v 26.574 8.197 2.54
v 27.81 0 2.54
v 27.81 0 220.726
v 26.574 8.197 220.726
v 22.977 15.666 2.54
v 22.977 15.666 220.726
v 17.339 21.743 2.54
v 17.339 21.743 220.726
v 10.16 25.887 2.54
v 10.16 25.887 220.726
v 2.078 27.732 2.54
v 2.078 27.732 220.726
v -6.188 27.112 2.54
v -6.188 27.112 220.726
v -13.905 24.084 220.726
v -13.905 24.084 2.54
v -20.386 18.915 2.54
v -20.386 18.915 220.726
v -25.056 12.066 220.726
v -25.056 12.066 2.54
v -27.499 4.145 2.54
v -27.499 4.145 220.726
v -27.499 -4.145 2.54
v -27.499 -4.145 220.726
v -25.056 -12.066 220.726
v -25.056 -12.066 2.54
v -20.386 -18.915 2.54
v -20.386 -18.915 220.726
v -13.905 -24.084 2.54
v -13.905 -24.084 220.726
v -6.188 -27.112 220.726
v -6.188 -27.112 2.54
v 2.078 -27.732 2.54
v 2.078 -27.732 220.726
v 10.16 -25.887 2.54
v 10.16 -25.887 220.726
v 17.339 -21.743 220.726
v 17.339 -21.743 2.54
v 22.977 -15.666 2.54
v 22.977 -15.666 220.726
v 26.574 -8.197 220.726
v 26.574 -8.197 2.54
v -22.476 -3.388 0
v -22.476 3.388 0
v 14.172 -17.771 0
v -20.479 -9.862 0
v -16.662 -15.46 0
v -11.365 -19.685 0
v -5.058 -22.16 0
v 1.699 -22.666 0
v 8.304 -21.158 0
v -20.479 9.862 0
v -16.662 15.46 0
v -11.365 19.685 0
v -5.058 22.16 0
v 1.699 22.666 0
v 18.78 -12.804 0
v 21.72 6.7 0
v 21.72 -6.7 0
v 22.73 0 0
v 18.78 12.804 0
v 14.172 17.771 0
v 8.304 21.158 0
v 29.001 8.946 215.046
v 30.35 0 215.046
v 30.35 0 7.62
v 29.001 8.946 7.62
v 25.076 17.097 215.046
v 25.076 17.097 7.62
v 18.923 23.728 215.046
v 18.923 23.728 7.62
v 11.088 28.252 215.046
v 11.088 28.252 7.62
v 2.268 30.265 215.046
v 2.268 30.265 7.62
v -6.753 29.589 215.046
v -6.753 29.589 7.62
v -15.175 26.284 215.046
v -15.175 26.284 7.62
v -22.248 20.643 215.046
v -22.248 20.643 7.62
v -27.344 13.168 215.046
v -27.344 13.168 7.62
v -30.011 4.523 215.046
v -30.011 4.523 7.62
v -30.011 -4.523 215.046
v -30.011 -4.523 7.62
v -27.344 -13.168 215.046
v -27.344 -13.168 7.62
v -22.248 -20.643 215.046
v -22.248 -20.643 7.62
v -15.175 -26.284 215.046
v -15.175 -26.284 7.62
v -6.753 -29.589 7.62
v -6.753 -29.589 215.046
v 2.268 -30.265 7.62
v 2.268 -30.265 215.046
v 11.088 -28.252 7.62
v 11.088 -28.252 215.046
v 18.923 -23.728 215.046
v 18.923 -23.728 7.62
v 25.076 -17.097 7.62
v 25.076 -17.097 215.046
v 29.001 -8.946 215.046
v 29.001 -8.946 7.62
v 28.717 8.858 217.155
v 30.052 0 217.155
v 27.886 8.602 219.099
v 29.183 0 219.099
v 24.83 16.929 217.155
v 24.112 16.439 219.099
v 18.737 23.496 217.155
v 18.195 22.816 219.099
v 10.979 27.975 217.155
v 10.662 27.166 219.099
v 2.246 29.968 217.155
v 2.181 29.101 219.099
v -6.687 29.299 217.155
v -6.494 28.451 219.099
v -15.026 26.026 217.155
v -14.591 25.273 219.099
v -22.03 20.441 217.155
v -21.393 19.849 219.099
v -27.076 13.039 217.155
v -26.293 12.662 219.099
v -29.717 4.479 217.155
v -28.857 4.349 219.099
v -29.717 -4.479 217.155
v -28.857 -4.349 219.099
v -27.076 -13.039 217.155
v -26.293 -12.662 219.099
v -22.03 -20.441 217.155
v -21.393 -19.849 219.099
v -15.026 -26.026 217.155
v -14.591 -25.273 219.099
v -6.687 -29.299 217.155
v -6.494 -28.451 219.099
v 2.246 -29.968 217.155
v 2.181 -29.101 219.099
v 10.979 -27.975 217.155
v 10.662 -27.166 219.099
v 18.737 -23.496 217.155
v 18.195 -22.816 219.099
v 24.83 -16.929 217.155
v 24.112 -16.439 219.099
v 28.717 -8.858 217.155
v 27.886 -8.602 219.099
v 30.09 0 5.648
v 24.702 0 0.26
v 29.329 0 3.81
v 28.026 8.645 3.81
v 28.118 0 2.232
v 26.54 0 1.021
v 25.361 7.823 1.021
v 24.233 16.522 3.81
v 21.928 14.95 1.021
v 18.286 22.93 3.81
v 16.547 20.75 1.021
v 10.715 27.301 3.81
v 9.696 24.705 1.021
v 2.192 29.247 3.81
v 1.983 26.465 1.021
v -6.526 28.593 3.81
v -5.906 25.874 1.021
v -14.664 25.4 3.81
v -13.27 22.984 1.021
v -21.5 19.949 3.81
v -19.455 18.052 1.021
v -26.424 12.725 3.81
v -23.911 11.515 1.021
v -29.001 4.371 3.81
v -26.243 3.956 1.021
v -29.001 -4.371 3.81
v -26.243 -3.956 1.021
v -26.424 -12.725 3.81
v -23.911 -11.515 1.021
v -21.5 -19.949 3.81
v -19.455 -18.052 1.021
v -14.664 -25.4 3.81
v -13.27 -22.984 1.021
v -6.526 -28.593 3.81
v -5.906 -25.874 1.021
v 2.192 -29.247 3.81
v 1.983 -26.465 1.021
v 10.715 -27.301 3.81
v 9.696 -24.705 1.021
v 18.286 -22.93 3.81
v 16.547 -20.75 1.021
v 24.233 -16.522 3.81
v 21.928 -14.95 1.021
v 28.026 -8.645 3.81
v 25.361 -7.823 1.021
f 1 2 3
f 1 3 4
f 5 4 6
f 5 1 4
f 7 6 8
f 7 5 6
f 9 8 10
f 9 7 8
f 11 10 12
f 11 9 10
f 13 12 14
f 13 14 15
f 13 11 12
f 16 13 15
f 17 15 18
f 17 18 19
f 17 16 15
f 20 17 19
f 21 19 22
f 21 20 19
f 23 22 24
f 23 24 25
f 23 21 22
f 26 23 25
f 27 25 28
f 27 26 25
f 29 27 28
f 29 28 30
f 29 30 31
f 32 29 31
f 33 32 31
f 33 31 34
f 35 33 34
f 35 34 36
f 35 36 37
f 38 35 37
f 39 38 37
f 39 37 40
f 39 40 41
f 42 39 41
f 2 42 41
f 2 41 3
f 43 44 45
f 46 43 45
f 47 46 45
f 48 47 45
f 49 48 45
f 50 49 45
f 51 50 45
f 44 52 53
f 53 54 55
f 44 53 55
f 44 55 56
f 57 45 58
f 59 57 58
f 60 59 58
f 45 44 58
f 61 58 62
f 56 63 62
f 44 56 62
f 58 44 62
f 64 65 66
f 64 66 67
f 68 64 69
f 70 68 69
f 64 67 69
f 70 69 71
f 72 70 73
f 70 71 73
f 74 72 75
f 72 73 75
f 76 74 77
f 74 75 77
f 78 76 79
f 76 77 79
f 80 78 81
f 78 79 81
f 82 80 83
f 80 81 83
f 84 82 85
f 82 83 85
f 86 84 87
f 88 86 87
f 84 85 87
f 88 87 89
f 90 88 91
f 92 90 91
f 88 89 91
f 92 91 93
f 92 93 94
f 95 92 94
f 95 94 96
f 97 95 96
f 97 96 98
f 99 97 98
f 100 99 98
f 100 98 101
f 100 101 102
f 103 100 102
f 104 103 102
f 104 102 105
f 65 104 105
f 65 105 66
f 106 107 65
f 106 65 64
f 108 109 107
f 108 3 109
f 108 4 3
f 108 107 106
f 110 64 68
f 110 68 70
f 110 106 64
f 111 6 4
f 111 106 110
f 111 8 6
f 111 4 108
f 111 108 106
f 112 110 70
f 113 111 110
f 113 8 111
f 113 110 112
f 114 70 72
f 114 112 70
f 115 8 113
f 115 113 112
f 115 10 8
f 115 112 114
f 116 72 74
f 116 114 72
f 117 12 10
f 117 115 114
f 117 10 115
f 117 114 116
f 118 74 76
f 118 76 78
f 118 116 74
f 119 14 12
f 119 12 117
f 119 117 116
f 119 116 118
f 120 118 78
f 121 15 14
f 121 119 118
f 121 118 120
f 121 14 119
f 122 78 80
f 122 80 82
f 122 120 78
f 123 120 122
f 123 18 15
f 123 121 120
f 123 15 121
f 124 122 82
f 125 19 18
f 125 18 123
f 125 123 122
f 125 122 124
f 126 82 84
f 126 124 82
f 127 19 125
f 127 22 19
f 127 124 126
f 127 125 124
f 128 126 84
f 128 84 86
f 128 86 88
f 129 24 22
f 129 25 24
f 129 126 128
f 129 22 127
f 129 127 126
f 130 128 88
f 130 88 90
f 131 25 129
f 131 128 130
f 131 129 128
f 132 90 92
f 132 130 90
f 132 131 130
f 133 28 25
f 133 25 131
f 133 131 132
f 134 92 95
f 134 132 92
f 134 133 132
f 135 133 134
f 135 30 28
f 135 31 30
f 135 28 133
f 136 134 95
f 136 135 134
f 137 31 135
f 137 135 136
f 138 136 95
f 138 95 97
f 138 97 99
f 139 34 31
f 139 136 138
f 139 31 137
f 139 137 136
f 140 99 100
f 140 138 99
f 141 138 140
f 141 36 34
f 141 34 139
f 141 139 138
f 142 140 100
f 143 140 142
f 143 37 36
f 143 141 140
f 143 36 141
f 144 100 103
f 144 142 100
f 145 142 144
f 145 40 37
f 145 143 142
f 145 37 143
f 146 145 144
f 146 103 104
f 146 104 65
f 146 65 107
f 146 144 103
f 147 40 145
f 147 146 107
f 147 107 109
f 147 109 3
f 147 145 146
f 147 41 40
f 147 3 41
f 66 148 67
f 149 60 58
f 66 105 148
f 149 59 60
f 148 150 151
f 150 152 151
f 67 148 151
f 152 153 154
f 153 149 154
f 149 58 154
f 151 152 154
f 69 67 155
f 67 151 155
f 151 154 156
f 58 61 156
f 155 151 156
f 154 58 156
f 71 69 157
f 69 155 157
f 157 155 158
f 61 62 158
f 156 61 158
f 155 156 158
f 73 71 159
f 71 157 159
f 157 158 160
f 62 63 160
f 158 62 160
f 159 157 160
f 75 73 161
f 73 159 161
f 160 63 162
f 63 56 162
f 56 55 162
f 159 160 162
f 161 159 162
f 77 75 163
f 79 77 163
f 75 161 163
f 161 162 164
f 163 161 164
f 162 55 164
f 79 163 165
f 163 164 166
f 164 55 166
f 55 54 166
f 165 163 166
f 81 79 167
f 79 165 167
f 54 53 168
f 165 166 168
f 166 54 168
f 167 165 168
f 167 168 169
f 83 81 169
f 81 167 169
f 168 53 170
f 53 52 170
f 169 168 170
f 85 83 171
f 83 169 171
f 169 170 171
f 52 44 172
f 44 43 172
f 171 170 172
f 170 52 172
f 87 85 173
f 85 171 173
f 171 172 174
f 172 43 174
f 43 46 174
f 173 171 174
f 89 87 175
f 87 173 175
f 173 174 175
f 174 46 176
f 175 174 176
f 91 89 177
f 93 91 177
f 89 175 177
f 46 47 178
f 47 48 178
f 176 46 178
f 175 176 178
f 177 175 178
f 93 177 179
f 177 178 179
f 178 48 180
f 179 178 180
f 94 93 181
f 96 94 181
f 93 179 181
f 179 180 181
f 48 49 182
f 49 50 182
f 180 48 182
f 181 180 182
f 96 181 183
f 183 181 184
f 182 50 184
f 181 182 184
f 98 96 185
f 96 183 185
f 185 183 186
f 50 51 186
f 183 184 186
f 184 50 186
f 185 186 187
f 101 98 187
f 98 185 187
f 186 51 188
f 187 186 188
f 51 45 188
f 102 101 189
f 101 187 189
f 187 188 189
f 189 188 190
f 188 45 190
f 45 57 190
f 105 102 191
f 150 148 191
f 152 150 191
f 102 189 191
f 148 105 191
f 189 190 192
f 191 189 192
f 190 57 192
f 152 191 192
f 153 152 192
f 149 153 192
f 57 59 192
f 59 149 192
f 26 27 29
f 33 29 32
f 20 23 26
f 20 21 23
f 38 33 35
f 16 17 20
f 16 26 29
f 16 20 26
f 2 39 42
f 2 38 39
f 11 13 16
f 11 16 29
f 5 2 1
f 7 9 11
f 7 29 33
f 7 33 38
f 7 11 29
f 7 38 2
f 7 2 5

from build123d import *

# Parameters (mm, degrees)
F0_R     = 30.3497039052
F1_DEPTH = 220.726
F2_T     = -2.54


# Not quite as in the source:
# - a fillet or chamfer that OpenCascade refuses, or shapes differently, is made with other operations: its cross-section is extruded or revolved along the edge and cut away or added


with BuildPart() as f1:
    # F0 (on Top) → F1 (new body)
    with BuildSketch(Plane.XY):
        Circle(F0_R)
    extrude(amount=F1_DEPTH)

    # F2
    f2_openings = [f1.faces().sort_by_distance(p)[0] for p in [
        (0, 0, 220.726),
    ]]
    offset(amount=F2_T, openings=f2_openings)

    # F3: fillet of radius 7.62 on 3 edges, made by hand

    # F3_s1 → F3_t2 (revolve, cut)
    with BuildSketch(Plane.XZ):
        with BuildLine():
            ThreePointArc((30.3497039052, 7.62), (28.1178575778, 2.2318463274), (22.7297039052, 0))
            Line((22.7297039052, 0), (30.3497039052, 0))
            Line((30.3497039052, 0), (30.3497039052, 7.62))
        make_face()
    revolve(axis=Axis((0, 0, 0), (0, 0, 1)), mode=Mode.SUBTRACT)

    # F3_s3 → F3_t4 (revolve, cut)
    with BuildSketch(Plane.XZ):
        with BuildLine():
            ThreePointArc((30.3497039052, 215.0463873372), (29.6857803855, 218.1572393105), (27.8097039052, 220.726))
            Line((27.8097039052, 220.726), (30.3497039052, 220.726))
            Line((30.3497039052, 220.726), (30.3497039052, 215.0463873372))
        make_face()
    revolve(axis=Axis((0, 0, 220.726), (0, 0, 1)), mode=Mode.SUBTRACT)


solid = f1.part
